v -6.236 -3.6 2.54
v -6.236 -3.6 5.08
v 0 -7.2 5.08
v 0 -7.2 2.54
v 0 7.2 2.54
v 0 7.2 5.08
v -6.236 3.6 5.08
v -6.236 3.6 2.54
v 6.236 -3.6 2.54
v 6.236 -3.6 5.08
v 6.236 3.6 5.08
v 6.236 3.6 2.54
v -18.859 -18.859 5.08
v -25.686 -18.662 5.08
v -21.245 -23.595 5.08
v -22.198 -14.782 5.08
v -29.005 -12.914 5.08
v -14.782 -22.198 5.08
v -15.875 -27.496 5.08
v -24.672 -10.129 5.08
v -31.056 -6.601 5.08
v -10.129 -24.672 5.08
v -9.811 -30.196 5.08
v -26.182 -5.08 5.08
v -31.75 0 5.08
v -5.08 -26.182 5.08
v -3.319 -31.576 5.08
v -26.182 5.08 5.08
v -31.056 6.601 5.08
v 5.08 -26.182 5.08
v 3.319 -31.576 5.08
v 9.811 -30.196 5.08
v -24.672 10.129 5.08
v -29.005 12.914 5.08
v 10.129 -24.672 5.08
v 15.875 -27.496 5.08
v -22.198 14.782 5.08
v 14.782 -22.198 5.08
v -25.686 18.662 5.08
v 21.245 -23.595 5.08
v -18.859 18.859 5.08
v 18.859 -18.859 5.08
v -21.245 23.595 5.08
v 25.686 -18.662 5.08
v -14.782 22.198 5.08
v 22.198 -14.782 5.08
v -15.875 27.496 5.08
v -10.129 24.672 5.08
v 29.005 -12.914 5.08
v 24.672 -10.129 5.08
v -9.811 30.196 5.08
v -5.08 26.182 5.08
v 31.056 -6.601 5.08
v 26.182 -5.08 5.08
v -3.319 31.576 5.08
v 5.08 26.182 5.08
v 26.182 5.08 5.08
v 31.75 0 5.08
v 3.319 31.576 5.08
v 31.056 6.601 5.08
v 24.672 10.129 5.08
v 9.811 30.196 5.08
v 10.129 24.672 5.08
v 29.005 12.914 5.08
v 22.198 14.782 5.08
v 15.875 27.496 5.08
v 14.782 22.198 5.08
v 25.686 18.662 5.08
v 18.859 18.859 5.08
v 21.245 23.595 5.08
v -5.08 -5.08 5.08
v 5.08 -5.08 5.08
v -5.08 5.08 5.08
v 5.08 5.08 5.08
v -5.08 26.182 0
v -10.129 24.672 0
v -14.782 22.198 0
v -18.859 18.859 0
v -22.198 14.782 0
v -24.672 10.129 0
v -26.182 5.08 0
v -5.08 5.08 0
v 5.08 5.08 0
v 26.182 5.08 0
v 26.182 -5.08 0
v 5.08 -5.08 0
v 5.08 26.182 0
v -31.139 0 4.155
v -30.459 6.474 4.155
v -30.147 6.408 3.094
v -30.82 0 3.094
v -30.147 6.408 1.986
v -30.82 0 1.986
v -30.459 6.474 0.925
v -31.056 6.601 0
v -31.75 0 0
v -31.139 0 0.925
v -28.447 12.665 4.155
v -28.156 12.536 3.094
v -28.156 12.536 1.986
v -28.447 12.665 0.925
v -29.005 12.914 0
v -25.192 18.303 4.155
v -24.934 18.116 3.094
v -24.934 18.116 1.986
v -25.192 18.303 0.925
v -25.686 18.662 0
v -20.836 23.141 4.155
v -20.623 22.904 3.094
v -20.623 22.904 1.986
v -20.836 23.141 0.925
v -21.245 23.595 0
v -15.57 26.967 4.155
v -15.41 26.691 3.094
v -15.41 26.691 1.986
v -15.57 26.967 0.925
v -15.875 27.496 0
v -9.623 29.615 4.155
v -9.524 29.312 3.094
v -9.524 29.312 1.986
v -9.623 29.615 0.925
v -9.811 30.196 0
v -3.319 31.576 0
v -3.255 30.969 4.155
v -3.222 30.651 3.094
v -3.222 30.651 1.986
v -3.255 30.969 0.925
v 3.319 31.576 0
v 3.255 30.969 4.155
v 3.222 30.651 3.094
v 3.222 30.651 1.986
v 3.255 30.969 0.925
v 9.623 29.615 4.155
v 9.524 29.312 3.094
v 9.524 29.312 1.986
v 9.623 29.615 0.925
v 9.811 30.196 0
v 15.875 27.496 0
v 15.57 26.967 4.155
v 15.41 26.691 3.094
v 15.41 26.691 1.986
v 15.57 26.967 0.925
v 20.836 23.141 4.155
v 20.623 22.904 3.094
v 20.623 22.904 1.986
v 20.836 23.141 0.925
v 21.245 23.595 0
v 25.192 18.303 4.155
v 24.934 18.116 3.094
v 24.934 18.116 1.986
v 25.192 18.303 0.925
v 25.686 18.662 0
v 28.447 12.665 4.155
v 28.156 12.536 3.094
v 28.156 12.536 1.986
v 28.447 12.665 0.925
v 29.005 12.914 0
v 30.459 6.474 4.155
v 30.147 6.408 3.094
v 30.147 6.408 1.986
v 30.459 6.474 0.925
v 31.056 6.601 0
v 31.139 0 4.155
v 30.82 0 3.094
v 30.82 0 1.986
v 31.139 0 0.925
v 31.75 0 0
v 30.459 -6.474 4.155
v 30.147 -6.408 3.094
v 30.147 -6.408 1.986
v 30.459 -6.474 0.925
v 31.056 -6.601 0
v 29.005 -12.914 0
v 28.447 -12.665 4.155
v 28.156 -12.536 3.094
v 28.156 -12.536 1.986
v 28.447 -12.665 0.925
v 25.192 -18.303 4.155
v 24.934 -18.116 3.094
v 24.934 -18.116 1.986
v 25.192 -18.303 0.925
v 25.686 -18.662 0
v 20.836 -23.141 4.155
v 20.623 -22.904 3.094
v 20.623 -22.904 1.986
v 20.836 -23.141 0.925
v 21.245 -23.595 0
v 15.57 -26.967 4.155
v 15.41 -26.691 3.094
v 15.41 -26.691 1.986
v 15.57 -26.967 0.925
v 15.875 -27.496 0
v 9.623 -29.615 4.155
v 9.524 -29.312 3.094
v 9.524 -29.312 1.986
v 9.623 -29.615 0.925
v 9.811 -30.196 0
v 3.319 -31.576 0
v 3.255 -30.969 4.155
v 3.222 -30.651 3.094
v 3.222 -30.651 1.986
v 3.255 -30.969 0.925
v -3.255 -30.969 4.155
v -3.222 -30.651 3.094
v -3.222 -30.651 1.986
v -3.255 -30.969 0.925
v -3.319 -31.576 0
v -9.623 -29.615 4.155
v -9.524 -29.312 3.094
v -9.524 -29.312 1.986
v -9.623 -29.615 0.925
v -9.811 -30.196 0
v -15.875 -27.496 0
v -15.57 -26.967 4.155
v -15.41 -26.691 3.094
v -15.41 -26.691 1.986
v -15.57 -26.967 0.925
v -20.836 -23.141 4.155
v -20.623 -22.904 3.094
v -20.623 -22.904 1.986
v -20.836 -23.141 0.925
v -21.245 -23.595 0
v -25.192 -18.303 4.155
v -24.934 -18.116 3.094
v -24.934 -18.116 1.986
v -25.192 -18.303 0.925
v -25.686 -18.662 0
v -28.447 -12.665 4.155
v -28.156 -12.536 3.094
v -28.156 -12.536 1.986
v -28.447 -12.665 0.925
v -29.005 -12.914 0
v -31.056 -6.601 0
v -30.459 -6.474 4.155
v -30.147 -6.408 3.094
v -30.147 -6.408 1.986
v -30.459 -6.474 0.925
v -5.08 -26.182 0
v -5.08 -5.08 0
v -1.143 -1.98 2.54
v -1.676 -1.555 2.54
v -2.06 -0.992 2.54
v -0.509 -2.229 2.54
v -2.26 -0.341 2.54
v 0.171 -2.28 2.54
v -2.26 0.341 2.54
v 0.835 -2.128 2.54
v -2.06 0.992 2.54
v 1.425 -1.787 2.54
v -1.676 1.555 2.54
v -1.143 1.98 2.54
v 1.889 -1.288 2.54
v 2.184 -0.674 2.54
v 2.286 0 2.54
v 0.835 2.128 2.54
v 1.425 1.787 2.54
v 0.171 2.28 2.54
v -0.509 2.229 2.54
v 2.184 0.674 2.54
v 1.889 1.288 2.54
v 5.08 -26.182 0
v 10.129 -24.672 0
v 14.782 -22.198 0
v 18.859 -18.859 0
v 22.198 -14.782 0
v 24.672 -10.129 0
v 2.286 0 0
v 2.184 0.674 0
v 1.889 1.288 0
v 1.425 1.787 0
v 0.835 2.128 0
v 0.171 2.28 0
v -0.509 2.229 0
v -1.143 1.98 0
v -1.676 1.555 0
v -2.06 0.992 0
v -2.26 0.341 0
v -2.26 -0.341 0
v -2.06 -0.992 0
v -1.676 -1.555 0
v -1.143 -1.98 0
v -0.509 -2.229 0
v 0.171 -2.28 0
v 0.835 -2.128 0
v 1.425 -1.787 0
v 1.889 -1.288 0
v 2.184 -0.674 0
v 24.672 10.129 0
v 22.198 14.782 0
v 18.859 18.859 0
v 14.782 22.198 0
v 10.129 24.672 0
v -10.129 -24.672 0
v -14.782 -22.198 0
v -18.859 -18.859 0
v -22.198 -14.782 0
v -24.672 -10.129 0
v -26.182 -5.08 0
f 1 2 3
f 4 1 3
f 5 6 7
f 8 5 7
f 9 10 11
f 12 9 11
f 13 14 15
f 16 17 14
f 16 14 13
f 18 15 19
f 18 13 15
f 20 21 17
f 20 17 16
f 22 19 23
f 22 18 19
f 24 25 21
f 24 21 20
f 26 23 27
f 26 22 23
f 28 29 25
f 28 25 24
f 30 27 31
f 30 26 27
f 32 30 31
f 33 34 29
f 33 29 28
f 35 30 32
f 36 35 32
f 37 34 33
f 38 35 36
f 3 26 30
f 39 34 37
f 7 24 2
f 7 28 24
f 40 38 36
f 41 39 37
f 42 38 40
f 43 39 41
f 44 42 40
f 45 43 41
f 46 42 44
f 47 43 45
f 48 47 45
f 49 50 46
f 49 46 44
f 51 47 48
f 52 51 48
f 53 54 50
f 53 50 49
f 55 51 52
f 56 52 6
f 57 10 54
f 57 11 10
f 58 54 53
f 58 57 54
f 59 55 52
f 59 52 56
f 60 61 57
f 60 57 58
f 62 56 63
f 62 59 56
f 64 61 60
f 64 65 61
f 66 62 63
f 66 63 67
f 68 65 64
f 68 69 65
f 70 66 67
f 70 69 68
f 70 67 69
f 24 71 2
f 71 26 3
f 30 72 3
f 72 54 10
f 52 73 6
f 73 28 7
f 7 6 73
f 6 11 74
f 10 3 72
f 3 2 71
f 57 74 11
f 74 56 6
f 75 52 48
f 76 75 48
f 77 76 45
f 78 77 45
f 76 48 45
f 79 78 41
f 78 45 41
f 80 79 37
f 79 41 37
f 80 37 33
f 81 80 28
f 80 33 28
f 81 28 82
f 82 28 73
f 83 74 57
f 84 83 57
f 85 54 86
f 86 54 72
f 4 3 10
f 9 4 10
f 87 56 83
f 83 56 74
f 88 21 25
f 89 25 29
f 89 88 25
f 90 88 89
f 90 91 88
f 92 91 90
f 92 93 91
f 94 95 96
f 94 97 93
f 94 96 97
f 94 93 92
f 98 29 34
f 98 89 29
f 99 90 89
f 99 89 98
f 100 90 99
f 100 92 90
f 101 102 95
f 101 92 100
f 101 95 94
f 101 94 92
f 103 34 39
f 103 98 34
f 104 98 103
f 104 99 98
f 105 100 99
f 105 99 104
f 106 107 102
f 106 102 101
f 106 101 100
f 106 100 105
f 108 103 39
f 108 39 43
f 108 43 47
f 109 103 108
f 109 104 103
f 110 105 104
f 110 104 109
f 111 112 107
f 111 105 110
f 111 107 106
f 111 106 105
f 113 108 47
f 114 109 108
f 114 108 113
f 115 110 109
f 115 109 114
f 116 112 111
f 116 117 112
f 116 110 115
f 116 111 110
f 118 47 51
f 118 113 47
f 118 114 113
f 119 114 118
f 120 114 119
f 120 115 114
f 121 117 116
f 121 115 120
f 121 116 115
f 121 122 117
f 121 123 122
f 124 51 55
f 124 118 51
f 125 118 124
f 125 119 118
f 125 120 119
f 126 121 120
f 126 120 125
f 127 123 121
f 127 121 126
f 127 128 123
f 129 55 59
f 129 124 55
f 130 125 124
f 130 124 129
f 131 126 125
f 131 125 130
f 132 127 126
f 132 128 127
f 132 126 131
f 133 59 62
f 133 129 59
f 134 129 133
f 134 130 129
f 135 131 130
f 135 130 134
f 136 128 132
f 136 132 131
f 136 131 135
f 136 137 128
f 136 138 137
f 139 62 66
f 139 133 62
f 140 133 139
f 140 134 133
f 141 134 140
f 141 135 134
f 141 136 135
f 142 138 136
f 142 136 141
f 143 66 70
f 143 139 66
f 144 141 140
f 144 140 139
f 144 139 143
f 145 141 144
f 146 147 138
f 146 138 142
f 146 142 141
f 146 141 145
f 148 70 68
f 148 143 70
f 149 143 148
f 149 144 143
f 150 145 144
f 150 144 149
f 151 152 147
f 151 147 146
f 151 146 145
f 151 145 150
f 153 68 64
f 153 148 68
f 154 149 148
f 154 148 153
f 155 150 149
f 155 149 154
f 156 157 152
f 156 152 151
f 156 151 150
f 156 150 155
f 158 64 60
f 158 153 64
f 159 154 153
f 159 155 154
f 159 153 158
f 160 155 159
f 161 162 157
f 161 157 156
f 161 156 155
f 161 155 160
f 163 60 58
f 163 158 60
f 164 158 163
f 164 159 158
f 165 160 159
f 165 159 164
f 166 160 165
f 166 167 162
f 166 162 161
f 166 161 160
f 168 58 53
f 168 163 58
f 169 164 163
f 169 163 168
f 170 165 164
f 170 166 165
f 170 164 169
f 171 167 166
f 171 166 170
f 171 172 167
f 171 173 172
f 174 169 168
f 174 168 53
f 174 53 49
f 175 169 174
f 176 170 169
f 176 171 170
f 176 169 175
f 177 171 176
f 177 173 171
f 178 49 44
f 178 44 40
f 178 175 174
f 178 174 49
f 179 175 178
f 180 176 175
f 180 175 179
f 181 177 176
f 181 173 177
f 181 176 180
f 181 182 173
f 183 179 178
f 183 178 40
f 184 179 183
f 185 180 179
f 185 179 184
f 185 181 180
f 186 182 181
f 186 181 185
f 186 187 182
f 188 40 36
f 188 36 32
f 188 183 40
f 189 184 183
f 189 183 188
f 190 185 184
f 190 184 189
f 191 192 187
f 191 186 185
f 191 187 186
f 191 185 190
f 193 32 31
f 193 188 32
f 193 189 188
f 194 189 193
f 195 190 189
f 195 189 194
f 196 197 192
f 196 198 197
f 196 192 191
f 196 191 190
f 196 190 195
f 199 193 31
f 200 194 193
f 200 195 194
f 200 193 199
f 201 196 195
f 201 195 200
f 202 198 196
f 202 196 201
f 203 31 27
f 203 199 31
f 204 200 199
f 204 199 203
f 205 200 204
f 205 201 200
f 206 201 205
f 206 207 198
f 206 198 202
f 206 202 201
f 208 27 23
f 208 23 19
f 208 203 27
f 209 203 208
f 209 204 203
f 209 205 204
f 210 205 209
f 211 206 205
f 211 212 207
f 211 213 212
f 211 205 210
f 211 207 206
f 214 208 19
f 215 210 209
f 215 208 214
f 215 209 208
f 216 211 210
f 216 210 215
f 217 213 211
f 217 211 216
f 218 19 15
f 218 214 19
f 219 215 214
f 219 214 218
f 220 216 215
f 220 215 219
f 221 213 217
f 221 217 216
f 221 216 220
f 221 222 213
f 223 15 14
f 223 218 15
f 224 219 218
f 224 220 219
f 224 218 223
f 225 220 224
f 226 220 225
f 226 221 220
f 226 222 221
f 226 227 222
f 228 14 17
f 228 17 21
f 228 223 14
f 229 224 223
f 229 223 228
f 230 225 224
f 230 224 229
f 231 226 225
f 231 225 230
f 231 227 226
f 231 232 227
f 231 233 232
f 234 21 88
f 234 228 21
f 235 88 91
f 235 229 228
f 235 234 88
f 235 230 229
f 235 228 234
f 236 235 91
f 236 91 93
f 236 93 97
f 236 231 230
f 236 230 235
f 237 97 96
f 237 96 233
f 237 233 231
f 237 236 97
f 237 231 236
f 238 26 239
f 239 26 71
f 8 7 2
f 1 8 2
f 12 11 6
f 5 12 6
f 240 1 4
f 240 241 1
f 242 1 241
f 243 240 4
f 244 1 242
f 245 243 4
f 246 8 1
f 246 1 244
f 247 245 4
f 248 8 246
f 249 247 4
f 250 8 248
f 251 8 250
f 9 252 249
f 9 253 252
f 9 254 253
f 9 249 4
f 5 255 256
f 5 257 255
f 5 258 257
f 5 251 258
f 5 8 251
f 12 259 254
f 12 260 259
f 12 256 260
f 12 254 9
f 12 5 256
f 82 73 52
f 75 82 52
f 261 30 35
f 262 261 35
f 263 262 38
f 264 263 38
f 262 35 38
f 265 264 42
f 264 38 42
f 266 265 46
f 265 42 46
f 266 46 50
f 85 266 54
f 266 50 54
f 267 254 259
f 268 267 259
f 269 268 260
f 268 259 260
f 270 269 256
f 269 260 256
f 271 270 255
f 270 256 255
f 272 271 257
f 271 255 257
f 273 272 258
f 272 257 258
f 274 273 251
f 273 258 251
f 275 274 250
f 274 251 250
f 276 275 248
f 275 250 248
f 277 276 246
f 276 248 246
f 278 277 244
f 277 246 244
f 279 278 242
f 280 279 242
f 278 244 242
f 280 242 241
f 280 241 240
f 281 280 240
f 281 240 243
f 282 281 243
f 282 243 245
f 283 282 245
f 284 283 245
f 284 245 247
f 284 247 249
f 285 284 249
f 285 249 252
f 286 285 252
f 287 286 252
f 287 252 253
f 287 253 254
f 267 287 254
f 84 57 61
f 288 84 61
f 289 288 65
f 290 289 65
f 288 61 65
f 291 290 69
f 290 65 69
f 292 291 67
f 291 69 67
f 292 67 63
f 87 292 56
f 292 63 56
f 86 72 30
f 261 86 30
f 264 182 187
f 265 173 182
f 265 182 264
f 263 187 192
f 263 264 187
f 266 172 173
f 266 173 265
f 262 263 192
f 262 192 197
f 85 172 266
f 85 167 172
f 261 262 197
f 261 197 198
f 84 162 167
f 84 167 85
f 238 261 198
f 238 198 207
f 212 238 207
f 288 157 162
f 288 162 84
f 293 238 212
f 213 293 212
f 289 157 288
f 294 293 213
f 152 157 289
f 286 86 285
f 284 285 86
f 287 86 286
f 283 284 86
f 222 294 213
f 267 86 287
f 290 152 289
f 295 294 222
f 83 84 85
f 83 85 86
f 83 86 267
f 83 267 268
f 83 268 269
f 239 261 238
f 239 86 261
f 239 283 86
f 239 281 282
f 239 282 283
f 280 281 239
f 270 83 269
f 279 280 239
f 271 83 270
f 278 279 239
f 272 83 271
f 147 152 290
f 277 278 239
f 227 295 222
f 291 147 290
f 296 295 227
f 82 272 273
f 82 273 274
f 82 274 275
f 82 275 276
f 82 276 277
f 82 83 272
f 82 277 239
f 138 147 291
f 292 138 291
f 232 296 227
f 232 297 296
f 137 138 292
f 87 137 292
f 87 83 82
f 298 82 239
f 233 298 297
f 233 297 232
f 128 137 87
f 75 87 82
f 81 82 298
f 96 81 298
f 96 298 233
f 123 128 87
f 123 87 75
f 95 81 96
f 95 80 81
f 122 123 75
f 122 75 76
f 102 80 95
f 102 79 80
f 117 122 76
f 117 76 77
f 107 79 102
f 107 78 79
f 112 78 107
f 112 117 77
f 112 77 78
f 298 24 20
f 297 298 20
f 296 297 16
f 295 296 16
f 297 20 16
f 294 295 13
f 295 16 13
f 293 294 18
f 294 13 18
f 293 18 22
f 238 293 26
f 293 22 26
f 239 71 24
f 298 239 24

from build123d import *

# Parameters (mm, degrees)
F3_DEPTH = 5.081
F5_DEPTH = 2.54
F6_R     = 2.286
F7_DEPTH = 2.541


with BuildPart() as f1:
    # F0 (on Front) → F1 (revolve)
    with BuildSketch(Plane.XZ):
        with BuildLine():
            Line((0, 5.08), (-31.75, 5.08))
            ThreePointArc((-31.75, 5.08), (-30.779806, 2.54), (-31.75, 0))
            Line((-31.75, 0), (0, 0))
            Line((0, 0), (0, 5.08))
        make_face()
    revolve(axis=Axis((0, 0, 2.54), (0, 0, -1)))

    # F2 (on face) → F3 (cut, through all)
    with BuildSketch(Plane.XY.offset(5.08)):
        with BuildLine():
            Line((-5.08, -5.08), (-26.181721, -5.08))
            ThreePointArc((-26.181721, -5.08), (-18.858538, -18.858538), (-5.08, -26.181721))
            Line((-5.08, -26.181721), (-5.08, -5.08))
        make_face()
        with BuildLine():
            ThreePointArc((-5.08, 26.181721), (-18.858538, 18.858538), (-26.181721, 5.08))
            Line((-26.181721, 5.08), (-5.08, 5.08))
            Line((-5.08, 5.08), (-5.08, 26.181721))
        make_face()
        with BuildLine():
            Line((5.08, -5.08), (5.08, -26.181721))
            ThreePointArc((5.08, -26.181721), (18.858538, -18.858538), (26.181721, -5.08))
            Line((26.181721, -5.08), (5.08, -5.08))
        make_face()
        with BuildLine():
            Line((5.08, 5.08), (26.181721, 5.08))
            ThreePointArc((26.181721, 5.08), (18.858538, 18.858538), (5.08, 26.181721))
            Line((5.08, 26.181721), (5.08, 5.08))
        make_face()
    extrude(amount=-F3_DEPTH, mode=Mode.SUBTRACT)

    # F4 (on face) → F5 (cut)
    with BuildSketch(Plane.XY.offset(5.08)):
        Polygon((-6.2357, 3.600183), (-6.2357, -3.600183), (0, -7.200366), (6.2357, -3.600183), (6.2357, 3.600183), (0, 7.200366), align=None)
    extrude(amount=-F5_DEPTH, mode=Mode.SUBTRACT)

    # F6 (on face) → F7 (cut, through all)
    with BuildSketch(Plane.XY.offset(2.54)):
        Circle(F6_R)
    extrude(amount=-F7_DEPTH, mode=Mode.SUBTRACT)


solid = f1.part
